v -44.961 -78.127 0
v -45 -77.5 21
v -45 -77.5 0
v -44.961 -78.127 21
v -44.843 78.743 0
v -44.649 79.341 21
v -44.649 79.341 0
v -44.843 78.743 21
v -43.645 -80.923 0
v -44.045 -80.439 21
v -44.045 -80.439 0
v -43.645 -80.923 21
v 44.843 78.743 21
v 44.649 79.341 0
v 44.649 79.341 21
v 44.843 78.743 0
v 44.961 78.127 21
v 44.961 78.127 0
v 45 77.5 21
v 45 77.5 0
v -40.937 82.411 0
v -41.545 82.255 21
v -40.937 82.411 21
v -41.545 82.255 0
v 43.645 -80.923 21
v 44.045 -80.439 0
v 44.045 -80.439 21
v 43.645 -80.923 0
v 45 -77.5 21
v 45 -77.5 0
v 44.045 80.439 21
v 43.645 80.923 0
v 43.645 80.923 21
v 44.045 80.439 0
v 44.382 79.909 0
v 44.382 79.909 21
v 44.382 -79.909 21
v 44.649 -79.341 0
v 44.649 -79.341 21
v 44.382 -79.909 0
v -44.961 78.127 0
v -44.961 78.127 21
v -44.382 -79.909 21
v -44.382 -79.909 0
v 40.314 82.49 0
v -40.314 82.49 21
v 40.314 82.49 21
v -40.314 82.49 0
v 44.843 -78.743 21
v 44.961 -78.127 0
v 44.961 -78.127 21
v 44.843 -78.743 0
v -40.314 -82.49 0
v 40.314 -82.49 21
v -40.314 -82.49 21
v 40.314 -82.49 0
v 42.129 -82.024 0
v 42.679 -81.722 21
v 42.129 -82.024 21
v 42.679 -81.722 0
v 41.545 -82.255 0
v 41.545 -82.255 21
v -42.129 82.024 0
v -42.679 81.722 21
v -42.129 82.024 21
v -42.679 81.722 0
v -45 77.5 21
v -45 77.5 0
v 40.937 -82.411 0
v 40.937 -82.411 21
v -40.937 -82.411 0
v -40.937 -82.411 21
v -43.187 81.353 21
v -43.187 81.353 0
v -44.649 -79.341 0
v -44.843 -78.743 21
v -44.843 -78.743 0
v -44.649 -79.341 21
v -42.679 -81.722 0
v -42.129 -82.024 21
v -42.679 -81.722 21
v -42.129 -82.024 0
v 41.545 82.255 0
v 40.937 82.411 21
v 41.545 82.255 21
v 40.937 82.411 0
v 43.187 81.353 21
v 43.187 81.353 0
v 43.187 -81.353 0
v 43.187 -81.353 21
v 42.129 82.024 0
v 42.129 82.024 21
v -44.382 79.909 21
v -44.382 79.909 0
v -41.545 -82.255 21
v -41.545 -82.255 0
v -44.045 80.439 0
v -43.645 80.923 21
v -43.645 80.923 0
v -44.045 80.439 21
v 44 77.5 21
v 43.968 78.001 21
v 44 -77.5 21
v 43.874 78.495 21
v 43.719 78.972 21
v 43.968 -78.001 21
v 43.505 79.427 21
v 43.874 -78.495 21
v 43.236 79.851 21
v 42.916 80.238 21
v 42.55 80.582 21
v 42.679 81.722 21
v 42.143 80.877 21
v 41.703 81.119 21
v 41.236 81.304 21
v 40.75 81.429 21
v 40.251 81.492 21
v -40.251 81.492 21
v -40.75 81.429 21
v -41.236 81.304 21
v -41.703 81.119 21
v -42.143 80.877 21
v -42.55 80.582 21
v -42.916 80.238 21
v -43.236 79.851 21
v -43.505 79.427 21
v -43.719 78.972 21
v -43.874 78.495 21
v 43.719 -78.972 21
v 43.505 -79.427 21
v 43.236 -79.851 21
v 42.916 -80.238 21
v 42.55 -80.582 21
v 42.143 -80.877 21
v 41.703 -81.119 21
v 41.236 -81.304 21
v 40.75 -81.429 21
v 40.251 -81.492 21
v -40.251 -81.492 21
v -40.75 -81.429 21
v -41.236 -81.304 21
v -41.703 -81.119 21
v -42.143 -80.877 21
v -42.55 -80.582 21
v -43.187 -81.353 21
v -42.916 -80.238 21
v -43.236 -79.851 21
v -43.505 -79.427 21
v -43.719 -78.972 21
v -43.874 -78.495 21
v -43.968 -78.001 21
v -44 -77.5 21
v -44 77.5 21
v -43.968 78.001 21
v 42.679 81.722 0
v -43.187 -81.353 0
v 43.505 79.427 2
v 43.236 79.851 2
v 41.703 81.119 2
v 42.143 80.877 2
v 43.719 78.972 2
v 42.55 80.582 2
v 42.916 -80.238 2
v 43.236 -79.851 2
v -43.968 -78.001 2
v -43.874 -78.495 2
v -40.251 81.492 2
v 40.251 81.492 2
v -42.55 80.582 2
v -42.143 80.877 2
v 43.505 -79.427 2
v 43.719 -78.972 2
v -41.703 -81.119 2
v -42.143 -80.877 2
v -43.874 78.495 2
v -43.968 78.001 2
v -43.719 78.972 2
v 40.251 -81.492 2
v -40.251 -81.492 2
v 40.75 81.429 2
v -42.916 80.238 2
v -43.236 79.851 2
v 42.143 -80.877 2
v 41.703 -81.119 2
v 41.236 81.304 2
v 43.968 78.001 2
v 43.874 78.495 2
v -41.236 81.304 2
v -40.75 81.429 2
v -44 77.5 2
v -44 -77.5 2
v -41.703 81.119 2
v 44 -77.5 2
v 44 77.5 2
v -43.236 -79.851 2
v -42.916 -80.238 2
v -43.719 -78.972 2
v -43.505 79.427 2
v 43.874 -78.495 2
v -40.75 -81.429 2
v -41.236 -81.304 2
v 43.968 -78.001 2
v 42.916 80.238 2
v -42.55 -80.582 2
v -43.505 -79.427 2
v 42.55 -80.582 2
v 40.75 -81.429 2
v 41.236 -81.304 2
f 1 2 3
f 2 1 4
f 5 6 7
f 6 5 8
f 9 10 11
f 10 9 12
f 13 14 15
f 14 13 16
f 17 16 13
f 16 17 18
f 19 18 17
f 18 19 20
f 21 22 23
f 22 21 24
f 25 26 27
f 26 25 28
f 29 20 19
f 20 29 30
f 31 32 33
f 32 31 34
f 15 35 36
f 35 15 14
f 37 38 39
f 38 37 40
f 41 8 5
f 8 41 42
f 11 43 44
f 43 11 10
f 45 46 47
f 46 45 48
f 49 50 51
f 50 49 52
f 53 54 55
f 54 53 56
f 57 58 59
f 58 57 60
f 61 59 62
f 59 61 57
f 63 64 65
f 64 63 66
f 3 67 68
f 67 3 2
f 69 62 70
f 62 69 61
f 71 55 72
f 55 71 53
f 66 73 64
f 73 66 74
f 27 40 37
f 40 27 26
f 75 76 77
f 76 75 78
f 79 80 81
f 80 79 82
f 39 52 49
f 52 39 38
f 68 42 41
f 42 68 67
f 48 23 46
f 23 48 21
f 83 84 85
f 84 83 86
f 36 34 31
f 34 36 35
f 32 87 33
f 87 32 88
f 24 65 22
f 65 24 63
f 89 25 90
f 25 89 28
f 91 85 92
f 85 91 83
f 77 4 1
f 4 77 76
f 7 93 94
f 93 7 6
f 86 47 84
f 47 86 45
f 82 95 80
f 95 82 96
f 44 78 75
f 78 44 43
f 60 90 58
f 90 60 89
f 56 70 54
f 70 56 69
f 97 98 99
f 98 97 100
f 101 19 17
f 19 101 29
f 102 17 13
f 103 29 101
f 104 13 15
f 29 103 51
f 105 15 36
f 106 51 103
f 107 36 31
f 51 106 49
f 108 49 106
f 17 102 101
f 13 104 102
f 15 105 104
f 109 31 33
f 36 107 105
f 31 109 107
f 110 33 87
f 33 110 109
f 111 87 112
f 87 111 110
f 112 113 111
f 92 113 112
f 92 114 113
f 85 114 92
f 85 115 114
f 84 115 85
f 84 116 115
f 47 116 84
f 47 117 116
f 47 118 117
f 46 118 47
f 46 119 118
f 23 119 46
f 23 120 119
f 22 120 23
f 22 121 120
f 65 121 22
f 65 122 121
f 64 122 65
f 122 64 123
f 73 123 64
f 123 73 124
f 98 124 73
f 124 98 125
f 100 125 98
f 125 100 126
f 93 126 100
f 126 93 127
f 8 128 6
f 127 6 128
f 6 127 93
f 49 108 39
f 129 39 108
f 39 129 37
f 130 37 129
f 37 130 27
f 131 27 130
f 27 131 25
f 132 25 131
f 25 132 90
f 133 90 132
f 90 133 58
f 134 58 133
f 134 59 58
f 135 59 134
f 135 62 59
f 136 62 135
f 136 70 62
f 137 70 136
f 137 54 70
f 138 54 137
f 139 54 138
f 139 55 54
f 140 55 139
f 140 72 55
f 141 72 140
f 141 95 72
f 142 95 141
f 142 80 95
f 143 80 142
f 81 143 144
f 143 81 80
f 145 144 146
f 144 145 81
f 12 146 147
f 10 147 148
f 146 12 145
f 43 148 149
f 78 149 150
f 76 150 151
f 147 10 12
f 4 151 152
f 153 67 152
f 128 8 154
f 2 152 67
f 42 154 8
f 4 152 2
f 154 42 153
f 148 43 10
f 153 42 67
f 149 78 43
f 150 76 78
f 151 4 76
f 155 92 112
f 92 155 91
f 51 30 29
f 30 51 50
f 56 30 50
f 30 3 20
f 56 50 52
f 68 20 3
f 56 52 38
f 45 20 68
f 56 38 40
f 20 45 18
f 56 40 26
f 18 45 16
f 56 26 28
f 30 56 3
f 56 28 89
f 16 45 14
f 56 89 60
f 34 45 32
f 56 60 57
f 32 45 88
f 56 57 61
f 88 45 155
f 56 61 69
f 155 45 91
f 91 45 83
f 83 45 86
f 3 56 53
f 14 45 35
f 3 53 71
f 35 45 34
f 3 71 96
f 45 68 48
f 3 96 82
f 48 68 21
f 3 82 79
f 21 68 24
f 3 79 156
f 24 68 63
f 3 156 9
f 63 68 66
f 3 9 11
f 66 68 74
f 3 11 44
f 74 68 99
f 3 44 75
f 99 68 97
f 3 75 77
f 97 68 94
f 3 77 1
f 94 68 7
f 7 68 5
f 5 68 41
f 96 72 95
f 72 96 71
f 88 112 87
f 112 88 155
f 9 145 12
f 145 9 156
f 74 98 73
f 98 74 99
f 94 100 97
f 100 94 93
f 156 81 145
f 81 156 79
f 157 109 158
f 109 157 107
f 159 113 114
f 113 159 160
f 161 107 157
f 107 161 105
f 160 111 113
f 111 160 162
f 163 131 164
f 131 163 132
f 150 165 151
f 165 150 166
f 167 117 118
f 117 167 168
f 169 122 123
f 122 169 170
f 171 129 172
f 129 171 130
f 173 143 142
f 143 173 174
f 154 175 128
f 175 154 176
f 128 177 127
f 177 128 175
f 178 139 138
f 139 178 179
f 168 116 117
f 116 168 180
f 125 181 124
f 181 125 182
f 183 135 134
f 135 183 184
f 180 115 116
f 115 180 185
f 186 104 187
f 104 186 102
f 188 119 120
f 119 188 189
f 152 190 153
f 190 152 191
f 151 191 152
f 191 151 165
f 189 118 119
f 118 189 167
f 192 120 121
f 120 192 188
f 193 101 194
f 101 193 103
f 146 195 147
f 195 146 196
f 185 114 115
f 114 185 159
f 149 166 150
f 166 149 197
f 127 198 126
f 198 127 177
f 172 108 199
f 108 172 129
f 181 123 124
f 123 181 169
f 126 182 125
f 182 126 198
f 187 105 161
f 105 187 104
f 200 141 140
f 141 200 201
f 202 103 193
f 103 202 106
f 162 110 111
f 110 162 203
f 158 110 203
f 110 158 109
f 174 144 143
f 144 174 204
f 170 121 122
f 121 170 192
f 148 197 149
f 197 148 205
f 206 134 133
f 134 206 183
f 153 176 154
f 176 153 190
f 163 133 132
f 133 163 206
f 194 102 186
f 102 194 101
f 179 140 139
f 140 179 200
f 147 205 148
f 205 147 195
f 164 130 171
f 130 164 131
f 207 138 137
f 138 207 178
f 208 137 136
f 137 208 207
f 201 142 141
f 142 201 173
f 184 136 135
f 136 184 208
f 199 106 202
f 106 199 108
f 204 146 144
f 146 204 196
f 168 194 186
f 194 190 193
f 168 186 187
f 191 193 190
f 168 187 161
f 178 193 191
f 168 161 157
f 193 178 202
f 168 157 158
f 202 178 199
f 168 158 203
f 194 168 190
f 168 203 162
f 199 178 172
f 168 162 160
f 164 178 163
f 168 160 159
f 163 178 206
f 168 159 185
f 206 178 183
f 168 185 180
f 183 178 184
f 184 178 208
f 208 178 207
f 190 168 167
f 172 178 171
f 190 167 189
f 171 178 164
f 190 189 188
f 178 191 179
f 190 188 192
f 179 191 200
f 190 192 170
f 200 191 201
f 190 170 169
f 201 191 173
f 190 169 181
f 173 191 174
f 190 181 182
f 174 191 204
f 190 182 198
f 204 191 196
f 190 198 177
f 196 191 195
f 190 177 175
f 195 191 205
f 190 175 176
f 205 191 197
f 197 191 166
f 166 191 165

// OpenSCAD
$fn = 50;


difference() {
	union() {
		hull() {
			translate(v = [-40.0000000000, 77.5000000000, 0]) {
				cylinder(h = 21, r = 5);
			}
			translate(v = [40.0000000000, 77.5000000000, 0]) {
				cylinder(h = 21, r = 5);
			}
			translate(v = [-40.0000000000, -77.5000000000, 0]) {
				cylinder(h = 21, r = 5);
			}
			translate(v = [40.0000000000, -77.5000000000, 0]) {
				cylinder(h = 21, r = 5);
			}
		}
	}
	union() {
		translate(v = [0, 0, 2]) {
			hull() {
				translate(v = [-40.0000000000, 77.5000000000, 0]) {
					cylinder(h = 19, r = 4);
				}
				translate(v = [40.0000000000, 77.5000000000, 0]) {
					cylinder(h = 19, r = 4);
				}
				translate(v = [-40.0000000000, -77.5000000000, 0]) {
					cylinder(h = 19, r = 4);
				}
				translate(v = [40.0000000000, -77.5000000000, 0]) {
					cylinder(h = 19, r = 4);
				}
			}
		}
	}
}
